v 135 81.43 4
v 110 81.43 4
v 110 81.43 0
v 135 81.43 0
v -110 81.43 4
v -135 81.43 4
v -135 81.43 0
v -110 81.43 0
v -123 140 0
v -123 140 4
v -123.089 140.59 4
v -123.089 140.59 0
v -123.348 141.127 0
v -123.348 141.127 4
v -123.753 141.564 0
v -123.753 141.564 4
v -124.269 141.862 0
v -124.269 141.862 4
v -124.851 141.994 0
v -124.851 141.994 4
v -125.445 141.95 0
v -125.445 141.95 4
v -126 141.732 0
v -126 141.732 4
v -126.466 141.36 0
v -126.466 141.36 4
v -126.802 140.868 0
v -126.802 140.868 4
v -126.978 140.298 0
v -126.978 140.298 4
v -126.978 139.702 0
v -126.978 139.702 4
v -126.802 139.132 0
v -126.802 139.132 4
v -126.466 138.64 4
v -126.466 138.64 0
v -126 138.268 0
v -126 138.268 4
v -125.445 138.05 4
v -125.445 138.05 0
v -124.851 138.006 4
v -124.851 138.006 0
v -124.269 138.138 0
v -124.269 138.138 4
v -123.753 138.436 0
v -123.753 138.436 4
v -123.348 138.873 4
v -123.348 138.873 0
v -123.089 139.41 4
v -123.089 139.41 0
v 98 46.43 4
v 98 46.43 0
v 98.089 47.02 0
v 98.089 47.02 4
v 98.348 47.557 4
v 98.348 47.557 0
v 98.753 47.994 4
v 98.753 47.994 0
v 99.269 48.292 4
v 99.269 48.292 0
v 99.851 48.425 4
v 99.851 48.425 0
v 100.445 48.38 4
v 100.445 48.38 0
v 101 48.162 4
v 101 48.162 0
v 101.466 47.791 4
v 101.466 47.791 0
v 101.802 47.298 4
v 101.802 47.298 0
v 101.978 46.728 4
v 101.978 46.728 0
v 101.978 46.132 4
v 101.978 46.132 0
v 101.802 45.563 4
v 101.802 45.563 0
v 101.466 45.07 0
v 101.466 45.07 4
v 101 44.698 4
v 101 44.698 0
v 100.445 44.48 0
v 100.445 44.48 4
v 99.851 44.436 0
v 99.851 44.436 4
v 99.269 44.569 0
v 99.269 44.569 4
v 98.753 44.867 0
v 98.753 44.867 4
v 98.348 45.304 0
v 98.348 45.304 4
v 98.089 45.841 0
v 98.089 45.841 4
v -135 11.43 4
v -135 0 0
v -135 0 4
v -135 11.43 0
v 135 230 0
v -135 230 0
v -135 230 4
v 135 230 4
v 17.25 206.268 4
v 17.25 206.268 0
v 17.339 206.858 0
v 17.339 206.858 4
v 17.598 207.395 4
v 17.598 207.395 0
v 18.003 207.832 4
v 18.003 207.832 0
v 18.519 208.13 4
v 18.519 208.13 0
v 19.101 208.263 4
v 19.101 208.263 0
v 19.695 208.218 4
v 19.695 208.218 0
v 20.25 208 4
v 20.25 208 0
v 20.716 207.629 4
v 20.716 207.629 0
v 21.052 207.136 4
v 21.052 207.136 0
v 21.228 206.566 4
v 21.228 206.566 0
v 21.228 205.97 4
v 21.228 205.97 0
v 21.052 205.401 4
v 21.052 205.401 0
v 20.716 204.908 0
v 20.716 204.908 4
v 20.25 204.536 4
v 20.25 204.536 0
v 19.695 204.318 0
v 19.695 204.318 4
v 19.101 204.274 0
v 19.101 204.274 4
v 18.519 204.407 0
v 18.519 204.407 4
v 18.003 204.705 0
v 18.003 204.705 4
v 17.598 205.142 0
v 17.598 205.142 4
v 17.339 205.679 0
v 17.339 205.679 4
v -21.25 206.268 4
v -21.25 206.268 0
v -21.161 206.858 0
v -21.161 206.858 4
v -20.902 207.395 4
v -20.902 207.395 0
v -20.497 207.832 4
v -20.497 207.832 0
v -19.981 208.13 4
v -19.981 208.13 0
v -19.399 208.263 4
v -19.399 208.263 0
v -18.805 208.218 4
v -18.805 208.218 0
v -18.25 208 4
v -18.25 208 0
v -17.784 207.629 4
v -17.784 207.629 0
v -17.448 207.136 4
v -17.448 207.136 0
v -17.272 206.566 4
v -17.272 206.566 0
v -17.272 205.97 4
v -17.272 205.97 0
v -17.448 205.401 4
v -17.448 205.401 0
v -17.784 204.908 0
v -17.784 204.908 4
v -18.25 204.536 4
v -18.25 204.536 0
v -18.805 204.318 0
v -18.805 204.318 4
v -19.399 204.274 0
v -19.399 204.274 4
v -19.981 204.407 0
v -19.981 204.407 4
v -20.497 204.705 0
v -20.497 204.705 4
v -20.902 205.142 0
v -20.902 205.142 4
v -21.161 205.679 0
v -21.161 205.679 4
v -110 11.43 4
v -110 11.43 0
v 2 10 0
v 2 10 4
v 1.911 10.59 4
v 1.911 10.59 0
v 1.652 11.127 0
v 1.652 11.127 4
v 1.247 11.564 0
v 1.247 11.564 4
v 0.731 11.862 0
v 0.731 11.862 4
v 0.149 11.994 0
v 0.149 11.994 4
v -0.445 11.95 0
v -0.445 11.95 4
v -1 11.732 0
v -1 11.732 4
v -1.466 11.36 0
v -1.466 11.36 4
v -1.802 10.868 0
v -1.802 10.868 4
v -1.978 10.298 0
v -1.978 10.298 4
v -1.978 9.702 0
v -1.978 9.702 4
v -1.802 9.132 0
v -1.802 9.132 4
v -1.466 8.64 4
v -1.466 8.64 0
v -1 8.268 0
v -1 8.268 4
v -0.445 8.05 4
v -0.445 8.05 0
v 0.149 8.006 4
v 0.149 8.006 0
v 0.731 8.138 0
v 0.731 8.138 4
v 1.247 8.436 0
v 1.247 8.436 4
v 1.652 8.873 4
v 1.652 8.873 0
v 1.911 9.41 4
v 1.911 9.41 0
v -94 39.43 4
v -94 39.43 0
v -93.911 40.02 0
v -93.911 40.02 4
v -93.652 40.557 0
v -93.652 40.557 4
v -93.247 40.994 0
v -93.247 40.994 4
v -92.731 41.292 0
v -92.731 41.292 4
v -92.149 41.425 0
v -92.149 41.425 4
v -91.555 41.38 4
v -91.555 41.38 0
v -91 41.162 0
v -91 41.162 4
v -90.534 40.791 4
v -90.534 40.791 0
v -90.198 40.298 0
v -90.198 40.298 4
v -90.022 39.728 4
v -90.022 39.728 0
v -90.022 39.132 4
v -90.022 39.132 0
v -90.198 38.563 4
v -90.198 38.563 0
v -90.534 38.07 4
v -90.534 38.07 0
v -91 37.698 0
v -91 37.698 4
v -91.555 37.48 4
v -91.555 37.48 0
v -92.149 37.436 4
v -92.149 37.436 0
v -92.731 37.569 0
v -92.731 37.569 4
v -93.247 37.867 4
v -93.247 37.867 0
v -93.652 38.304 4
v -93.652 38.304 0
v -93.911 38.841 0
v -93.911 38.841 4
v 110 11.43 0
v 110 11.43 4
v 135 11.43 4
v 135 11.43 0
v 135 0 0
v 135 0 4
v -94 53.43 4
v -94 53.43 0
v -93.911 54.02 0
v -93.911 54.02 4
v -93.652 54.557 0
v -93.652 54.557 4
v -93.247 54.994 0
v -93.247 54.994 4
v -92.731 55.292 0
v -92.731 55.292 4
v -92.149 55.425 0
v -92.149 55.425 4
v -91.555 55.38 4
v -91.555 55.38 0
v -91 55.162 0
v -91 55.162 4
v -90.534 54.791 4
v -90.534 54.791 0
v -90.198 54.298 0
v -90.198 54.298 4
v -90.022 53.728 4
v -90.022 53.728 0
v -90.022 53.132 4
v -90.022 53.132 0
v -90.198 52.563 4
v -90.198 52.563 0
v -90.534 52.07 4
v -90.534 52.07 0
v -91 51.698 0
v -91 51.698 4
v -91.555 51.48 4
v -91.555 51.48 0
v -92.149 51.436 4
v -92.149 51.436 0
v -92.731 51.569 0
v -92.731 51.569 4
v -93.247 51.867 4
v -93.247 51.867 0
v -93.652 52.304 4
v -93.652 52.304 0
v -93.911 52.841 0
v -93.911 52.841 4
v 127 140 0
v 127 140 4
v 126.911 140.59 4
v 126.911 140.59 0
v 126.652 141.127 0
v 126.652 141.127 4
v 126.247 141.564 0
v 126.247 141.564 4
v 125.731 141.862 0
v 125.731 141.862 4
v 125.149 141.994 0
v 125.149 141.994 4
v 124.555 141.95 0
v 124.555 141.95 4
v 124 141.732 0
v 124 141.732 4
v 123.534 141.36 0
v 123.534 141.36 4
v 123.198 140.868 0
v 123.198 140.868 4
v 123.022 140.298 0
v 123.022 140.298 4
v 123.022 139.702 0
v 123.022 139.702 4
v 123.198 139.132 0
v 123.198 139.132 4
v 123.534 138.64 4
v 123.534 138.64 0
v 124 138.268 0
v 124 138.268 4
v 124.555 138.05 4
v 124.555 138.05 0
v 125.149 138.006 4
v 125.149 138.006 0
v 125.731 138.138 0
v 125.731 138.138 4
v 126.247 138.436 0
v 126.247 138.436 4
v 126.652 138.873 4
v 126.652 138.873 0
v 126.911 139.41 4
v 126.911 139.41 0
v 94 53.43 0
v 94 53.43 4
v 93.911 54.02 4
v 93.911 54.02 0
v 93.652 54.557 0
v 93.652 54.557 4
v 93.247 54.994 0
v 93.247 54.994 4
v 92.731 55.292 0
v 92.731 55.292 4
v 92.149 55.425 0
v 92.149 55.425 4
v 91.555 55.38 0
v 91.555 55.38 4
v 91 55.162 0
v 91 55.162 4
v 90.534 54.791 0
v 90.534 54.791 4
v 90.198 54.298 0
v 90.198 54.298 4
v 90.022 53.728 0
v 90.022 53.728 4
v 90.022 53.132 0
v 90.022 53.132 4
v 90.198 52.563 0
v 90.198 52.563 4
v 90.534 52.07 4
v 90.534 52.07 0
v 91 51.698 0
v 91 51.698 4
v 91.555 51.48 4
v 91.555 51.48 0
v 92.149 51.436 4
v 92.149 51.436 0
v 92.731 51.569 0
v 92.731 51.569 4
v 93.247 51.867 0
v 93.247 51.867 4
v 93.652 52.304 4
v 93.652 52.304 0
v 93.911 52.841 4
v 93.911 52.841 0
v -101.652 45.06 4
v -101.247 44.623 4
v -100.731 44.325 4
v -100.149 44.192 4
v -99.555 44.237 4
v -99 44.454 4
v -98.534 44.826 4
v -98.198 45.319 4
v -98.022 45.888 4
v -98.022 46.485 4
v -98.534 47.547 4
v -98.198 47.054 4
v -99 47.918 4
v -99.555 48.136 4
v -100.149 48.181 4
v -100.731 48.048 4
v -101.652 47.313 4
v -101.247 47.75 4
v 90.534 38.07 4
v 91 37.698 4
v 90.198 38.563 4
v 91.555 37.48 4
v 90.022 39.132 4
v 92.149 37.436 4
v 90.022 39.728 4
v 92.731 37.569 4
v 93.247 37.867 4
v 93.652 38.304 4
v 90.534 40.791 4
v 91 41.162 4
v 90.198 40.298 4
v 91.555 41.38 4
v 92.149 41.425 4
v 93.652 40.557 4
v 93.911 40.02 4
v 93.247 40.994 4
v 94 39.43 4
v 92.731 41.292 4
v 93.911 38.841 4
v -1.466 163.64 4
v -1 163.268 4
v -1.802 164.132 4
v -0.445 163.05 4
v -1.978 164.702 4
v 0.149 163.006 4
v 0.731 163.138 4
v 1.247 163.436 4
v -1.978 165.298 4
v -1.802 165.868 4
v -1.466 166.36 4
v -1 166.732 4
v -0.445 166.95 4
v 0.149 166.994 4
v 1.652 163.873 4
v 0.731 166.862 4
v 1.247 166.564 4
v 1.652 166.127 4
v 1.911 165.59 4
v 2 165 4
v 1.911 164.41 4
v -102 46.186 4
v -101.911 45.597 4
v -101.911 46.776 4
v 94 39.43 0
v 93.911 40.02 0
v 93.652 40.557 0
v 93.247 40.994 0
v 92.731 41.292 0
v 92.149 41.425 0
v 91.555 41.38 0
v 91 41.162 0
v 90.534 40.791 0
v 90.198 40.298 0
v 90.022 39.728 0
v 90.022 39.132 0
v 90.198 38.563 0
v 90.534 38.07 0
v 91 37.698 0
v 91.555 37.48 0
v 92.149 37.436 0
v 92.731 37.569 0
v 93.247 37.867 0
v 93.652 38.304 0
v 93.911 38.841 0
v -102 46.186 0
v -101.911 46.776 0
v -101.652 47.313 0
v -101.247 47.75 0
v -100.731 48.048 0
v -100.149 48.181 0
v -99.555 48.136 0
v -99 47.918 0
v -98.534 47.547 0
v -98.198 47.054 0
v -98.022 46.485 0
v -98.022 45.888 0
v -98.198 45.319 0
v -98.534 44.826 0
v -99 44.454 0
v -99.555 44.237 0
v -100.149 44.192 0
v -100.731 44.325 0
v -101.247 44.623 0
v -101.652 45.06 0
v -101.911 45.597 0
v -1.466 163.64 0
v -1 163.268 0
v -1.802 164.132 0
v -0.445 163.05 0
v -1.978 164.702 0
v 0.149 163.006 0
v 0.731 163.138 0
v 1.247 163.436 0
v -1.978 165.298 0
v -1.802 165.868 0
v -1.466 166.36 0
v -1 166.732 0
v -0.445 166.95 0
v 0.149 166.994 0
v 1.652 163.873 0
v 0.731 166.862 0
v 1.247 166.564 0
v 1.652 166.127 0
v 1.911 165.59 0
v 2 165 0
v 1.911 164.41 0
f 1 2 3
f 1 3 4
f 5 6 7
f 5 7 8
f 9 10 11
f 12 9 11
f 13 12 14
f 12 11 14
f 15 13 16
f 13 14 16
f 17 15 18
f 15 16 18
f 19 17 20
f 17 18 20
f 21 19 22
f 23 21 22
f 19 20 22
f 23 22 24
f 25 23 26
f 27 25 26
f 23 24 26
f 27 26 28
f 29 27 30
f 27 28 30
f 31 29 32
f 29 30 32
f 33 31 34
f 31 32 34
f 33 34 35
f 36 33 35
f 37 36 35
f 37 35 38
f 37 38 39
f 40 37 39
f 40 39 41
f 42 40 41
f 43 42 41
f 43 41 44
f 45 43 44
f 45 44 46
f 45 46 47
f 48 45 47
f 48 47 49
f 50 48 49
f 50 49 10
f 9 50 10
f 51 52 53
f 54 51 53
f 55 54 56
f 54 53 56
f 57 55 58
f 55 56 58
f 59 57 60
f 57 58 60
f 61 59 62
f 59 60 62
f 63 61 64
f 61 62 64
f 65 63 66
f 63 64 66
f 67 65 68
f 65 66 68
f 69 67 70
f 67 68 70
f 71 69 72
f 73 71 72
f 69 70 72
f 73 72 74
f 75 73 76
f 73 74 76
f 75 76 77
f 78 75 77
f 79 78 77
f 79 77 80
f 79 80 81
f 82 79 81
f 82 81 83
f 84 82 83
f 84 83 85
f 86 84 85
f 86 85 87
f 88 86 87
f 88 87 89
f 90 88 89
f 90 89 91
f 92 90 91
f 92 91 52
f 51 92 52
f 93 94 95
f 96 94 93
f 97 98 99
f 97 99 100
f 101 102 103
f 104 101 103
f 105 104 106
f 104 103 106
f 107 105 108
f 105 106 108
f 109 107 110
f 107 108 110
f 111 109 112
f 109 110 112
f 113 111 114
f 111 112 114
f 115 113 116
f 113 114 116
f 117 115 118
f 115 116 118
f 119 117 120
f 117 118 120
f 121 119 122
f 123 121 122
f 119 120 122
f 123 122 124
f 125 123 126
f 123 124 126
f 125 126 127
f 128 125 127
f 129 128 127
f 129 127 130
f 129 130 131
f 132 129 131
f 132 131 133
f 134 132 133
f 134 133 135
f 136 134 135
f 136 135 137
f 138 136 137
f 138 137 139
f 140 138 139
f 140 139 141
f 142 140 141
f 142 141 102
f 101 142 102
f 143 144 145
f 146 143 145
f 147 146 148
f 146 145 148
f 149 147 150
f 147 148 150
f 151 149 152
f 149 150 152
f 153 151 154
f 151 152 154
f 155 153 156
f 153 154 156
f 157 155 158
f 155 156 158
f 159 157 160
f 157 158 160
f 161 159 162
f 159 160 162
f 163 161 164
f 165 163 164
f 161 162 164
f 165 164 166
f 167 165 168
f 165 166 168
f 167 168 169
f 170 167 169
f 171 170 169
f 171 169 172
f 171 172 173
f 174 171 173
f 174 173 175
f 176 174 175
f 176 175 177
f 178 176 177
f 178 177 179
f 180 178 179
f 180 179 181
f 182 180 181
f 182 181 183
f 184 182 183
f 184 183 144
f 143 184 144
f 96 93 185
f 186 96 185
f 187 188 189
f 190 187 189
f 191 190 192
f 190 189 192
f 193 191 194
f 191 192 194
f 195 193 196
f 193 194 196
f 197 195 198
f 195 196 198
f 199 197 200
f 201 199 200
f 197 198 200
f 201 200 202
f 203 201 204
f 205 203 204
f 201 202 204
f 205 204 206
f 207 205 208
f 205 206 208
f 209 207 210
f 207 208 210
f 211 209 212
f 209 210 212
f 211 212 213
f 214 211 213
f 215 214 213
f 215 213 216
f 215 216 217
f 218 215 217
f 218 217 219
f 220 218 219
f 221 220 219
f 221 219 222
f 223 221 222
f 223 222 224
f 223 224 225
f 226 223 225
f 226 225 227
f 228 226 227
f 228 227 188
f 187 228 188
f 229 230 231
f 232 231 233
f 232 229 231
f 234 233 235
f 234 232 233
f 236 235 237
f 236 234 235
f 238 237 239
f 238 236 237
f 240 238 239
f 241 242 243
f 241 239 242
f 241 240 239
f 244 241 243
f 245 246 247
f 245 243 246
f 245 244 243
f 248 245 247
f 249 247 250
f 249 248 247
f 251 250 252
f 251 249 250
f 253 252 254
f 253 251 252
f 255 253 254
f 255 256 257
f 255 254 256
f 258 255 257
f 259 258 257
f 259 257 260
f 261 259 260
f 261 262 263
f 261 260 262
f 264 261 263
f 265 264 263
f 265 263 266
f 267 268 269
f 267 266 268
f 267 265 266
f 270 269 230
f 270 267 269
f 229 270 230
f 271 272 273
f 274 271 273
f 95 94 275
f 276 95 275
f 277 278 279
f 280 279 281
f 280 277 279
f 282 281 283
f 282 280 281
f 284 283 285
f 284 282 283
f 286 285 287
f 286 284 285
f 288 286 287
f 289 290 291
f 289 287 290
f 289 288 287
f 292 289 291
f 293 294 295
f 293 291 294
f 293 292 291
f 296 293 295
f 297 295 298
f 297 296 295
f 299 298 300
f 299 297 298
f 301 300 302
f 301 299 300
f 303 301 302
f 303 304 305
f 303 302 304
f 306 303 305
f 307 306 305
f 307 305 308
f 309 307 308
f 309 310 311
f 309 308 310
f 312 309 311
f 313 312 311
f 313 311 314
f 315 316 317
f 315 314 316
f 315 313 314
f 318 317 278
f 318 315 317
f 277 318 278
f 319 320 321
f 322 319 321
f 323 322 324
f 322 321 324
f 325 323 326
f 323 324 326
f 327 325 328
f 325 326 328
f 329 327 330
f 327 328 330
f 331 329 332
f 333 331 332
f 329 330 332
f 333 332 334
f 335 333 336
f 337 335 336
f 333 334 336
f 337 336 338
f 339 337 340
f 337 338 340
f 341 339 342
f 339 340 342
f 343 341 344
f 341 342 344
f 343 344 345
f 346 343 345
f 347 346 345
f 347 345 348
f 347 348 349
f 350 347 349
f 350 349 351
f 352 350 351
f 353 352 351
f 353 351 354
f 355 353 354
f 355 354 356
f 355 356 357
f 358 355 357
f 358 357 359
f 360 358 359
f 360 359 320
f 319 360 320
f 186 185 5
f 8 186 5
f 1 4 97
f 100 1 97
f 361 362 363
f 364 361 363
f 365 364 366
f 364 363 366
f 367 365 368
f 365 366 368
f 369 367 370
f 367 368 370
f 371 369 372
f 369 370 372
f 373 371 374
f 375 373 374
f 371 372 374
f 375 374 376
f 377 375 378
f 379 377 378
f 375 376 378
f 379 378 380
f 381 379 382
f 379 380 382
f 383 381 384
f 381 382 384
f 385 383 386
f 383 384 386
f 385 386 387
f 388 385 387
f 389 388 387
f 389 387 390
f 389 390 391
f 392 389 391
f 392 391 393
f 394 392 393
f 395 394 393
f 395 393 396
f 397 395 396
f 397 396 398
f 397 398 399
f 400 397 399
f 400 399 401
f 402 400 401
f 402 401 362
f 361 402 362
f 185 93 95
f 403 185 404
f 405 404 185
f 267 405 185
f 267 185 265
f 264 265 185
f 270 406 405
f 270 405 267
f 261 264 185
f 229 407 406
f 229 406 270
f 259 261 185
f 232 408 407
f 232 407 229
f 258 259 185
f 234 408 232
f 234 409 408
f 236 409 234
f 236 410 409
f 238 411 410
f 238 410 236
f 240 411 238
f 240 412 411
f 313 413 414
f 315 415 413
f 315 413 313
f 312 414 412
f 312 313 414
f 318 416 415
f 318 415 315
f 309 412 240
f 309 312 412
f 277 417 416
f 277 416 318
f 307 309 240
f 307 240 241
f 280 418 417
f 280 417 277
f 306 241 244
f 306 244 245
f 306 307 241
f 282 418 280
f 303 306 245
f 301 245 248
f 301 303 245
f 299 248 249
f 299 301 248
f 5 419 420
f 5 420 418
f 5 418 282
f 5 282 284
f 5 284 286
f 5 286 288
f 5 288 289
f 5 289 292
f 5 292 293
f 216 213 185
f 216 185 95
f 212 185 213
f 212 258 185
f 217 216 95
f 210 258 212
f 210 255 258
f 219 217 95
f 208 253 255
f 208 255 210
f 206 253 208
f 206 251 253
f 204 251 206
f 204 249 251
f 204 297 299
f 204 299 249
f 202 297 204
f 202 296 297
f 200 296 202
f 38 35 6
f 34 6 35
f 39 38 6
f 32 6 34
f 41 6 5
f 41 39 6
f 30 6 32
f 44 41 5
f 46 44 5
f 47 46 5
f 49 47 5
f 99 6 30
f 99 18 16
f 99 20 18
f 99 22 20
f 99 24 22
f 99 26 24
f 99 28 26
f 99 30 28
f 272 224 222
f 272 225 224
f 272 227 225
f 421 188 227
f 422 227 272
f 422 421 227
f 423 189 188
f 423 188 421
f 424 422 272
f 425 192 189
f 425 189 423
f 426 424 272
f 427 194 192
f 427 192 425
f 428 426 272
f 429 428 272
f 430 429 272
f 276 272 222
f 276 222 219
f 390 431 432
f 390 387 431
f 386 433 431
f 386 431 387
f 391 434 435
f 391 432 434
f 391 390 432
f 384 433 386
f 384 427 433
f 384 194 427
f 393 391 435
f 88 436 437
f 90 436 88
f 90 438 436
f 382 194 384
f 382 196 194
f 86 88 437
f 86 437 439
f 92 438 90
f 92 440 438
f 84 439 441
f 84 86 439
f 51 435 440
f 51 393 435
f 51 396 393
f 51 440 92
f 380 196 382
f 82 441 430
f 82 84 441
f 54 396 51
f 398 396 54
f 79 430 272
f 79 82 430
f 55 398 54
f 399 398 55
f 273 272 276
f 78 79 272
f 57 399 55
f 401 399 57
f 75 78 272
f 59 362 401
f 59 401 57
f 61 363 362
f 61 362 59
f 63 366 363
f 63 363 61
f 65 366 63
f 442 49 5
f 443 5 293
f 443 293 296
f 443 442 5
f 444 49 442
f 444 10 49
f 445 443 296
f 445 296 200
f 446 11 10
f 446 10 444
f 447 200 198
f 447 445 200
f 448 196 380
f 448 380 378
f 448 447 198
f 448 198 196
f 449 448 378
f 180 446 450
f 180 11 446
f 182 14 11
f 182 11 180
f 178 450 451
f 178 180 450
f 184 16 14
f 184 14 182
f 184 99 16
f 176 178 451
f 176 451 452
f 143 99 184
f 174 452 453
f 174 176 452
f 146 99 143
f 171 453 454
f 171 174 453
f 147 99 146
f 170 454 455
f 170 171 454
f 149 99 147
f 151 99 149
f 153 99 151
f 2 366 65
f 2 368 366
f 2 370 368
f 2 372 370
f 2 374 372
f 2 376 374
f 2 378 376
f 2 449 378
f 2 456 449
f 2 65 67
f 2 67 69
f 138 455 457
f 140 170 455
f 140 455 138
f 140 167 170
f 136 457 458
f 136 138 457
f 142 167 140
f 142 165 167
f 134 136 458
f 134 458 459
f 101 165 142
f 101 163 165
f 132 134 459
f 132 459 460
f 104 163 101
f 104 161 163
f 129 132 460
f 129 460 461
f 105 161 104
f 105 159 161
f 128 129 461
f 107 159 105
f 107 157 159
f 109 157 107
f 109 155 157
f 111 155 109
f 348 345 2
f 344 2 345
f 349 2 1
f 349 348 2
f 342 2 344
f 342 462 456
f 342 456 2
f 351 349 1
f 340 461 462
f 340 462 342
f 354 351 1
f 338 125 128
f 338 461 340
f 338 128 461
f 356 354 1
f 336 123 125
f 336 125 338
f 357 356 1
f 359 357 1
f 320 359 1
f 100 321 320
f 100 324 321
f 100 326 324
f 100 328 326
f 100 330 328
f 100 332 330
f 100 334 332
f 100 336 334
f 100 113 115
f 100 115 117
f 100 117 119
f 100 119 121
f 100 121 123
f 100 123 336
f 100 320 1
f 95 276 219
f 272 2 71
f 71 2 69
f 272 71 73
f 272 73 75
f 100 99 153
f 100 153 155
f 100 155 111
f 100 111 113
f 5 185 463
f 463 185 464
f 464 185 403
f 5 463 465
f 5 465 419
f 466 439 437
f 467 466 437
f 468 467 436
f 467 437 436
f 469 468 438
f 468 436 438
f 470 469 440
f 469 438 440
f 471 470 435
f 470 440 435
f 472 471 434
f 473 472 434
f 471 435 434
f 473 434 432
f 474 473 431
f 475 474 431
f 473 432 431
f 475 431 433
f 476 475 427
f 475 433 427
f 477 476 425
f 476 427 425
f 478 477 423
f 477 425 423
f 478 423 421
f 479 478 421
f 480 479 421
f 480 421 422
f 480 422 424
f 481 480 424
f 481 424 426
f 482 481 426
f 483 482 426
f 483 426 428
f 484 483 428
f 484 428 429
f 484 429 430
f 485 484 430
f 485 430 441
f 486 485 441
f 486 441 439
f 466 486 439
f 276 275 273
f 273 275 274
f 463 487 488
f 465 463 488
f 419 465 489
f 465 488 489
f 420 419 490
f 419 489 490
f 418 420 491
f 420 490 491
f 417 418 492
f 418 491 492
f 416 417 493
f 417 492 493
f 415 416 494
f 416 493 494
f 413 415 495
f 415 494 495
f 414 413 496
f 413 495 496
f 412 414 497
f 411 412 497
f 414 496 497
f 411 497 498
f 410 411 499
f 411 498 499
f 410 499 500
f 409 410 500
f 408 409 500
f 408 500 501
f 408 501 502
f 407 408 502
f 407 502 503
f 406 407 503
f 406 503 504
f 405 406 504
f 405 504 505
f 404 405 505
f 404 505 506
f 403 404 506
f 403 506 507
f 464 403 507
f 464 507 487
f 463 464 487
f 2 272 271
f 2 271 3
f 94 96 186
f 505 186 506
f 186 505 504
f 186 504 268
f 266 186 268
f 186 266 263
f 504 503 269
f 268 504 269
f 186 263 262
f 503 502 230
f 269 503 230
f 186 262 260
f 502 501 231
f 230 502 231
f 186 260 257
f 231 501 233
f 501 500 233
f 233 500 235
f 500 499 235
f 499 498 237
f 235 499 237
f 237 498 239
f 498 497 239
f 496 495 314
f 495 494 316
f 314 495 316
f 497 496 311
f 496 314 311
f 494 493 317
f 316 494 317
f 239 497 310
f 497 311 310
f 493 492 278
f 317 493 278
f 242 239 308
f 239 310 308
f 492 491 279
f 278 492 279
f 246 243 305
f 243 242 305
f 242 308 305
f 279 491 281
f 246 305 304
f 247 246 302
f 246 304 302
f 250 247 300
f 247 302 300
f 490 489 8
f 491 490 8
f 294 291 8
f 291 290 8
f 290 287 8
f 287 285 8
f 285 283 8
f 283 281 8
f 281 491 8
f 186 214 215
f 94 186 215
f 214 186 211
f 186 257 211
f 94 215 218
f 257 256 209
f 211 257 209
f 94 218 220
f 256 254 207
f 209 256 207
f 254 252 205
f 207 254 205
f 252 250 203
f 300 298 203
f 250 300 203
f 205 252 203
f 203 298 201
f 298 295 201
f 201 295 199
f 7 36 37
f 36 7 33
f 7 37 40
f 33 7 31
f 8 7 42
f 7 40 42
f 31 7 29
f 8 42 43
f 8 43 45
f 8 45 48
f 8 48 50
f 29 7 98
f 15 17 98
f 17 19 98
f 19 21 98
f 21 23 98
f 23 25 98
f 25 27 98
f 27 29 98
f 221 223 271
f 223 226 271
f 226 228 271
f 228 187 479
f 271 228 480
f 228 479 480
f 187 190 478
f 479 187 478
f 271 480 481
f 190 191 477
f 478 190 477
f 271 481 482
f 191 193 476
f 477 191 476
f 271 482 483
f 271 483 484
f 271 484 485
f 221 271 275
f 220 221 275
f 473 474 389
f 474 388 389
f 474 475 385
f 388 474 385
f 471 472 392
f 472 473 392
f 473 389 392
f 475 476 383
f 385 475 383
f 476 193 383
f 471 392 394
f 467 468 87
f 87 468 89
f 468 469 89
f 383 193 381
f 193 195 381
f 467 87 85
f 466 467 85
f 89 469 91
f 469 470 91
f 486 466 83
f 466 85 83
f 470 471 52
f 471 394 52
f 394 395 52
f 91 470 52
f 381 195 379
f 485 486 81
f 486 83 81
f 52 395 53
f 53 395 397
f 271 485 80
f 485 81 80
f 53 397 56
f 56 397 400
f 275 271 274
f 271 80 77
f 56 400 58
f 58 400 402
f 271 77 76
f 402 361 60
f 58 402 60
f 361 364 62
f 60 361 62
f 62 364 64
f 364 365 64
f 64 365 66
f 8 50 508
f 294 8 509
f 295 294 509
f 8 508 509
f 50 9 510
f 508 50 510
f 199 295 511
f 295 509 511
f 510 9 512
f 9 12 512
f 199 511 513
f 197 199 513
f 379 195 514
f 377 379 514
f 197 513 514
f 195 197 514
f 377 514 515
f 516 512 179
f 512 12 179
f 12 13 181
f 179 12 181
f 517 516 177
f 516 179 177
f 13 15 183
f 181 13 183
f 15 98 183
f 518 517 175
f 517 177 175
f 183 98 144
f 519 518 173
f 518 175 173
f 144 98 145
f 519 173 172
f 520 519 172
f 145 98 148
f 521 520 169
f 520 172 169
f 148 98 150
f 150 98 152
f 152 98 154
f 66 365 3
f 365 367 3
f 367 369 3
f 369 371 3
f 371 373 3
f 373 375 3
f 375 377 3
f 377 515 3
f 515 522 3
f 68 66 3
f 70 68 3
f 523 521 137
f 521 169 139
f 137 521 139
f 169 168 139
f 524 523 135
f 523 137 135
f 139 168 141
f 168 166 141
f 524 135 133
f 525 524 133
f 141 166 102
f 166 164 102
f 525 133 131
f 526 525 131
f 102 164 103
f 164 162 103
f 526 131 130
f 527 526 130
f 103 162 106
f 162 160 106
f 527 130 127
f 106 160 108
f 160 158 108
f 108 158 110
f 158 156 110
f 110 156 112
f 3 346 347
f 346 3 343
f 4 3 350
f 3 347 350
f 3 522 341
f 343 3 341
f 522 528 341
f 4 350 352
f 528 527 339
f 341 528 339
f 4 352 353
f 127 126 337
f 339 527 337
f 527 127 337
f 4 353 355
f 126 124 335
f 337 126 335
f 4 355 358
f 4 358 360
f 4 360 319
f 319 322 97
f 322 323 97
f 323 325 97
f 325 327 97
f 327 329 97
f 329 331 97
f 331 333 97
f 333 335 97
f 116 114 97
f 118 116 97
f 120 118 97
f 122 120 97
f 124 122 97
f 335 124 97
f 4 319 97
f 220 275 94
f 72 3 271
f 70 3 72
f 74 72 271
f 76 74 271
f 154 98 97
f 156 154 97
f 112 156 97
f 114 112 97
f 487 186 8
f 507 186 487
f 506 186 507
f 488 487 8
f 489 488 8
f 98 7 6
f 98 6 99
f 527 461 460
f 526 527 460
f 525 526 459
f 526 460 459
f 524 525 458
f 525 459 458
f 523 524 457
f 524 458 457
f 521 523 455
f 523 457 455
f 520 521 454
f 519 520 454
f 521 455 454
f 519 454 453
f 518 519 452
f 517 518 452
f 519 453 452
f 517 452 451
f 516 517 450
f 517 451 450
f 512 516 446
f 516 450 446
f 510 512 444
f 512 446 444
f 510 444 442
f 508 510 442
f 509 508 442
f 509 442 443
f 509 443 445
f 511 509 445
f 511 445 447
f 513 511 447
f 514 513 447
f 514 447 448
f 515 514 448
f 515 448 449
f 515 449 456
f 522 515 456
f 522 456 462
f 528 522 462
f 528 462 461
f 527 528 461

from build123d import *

# Parameters (mm, degrees)
SKETCH3_W           = 270
SKETCH3_H           = 230
BOSS_EXTRUDE1_DEPTH = 4
SKETCH4_W           = 25
SKETCH4_H           = 70
CUT_EXTRUDE1_DEPTH  = 10
SKETCH6_W           = 25
SKETCH6_H           = 70
CUT_EXTRUDE2_DEPTH  = 10
SKETCH9_R           = 2
CUT_EXTRUDE3_DEPTH  = 10
SKETCH10_R          = 2
CUT_EXTRUDE4_DEPTH  = 10
SKETCH12_R          = 2
CUT_EXTRUDE5_DEPTH  = 10
SKETCH14_R          = 2
CUT_EXTRUDE7_DEPTH  = 10
SKETCH15_R          = 2
CUT_EXTRUDE8_DEPTH  = 10


with BuildPart() as part:
    # Sketch3 → Boss-Extrude1 (new body)
    with BuildSketch(Plane.XY):
        with Locations((0, 115)):
            Rectangle(SKETCH3_W, SKETCH3_H)
    extrude(amount=BOSS_EXTRUDE1_DEPTH)

    # Sketch4 → Cut-Extrude1 (cut)
    with BuildSketch(Plane.XY.offset(4)):
        with Locations((-122.5, 46.430334796)):
            Rectangle(SKETCH4_W, SKETCH4_H)
    extrude(amount=-CUT_EXTRUDE1_DEPTH, mode=Mode.SUBTRACT)

    # Sketch6 → Cut-Extrude2 (cut)
    with BuildSketch(Plane.XY.offset(4)):
        with Locations((122.5, 46.430334796)):
            Rectangle(SKETCH6_W, SKETCH6_H)
    extrude(amount=-CUT_EXTRUDE2_DEPTH, mode=Mode.SUBTRACT)

    # Sketch9 → Cut-Extrude3 (cut)
    with BuildSketch(Plane(origin=(0, 0, 0), x_dir=(-1, 0, 0), z_dir=(0, 0, -1))):
        with Locations((-100, 46.430334796)):
            Circle(SKETCH9_R)
        with Locations((100, 46.186428088)):
            Circle(SKETCH9_R)
    extrude(amount=-CUT_EXTRUDE3_DEPTH, mode=Mode.SUBTRACT)

    # Sketch10 → Cut-Extrude4 (cut)
    with BuildSketch(Plane(origin=(0, 0, 0), x_dir=(-1, 0, 0), z_dir=(0, 0, -1))):
        with Locations((-19.25, 206.268311878)):
            Circle(SKETCH10_R)
        with Locations((19.25, 206.268311878)):
            Circle(SKETCH10_R)
    extrude(amount=-CUT_EXTRUDE4_DEPTH, mode=Mode.SUBTRACT)

    # Sketch12 → Cut-Extrude5 (cut)
    with BuildSketch(Plane.XY.offset(4)):
        with Locations((-125, 140)):
            Circle(SKETCH12_R)
        with Locations((125, 140)):
            Circle(SKETCH12_R)
        with Locations((0, 10)):
            Circle(SKETCH12_R)
    extrude(amount=-CUT_EXTRUDE5_DEPTH, mode=Mode.SUBTRACT)

    # Sketch14 → Cut-Extrude7 (cut)
    with BuildSketch(Plane.XY.offset(4)):
        with Locations((0, 165)):
            Circle(SKETCH14_R)
    extrude(amount=-CUT_EXTRUDE7_DEPTH, mode=Mode.SUBTRACT)

    # Sketch15 → Cut-Extrude8 (cut)
    with BuildSketch(Plane.XY.offset(4)):
        with Locations((92, 53.430334796)):
            Circle(SKETCH15_R)
        with Locations((92, 39.430334796)):
            Circle(SKETCH15_R)
    cut_extrude8 = extrude(amount=-CUT_EXTRUDE8_DEPTH, mode=Mode.SUBTRACT)

    # Mirror1: Cut-Extrude8 across plane
    add(cut_extrude8.mirror(Plane(origin=(0, 0, 0), x_dir=(0, 0, 1), z_dir=(1, 0, 0))), mode=Mode.SUBTRACT)


solid = part.part
